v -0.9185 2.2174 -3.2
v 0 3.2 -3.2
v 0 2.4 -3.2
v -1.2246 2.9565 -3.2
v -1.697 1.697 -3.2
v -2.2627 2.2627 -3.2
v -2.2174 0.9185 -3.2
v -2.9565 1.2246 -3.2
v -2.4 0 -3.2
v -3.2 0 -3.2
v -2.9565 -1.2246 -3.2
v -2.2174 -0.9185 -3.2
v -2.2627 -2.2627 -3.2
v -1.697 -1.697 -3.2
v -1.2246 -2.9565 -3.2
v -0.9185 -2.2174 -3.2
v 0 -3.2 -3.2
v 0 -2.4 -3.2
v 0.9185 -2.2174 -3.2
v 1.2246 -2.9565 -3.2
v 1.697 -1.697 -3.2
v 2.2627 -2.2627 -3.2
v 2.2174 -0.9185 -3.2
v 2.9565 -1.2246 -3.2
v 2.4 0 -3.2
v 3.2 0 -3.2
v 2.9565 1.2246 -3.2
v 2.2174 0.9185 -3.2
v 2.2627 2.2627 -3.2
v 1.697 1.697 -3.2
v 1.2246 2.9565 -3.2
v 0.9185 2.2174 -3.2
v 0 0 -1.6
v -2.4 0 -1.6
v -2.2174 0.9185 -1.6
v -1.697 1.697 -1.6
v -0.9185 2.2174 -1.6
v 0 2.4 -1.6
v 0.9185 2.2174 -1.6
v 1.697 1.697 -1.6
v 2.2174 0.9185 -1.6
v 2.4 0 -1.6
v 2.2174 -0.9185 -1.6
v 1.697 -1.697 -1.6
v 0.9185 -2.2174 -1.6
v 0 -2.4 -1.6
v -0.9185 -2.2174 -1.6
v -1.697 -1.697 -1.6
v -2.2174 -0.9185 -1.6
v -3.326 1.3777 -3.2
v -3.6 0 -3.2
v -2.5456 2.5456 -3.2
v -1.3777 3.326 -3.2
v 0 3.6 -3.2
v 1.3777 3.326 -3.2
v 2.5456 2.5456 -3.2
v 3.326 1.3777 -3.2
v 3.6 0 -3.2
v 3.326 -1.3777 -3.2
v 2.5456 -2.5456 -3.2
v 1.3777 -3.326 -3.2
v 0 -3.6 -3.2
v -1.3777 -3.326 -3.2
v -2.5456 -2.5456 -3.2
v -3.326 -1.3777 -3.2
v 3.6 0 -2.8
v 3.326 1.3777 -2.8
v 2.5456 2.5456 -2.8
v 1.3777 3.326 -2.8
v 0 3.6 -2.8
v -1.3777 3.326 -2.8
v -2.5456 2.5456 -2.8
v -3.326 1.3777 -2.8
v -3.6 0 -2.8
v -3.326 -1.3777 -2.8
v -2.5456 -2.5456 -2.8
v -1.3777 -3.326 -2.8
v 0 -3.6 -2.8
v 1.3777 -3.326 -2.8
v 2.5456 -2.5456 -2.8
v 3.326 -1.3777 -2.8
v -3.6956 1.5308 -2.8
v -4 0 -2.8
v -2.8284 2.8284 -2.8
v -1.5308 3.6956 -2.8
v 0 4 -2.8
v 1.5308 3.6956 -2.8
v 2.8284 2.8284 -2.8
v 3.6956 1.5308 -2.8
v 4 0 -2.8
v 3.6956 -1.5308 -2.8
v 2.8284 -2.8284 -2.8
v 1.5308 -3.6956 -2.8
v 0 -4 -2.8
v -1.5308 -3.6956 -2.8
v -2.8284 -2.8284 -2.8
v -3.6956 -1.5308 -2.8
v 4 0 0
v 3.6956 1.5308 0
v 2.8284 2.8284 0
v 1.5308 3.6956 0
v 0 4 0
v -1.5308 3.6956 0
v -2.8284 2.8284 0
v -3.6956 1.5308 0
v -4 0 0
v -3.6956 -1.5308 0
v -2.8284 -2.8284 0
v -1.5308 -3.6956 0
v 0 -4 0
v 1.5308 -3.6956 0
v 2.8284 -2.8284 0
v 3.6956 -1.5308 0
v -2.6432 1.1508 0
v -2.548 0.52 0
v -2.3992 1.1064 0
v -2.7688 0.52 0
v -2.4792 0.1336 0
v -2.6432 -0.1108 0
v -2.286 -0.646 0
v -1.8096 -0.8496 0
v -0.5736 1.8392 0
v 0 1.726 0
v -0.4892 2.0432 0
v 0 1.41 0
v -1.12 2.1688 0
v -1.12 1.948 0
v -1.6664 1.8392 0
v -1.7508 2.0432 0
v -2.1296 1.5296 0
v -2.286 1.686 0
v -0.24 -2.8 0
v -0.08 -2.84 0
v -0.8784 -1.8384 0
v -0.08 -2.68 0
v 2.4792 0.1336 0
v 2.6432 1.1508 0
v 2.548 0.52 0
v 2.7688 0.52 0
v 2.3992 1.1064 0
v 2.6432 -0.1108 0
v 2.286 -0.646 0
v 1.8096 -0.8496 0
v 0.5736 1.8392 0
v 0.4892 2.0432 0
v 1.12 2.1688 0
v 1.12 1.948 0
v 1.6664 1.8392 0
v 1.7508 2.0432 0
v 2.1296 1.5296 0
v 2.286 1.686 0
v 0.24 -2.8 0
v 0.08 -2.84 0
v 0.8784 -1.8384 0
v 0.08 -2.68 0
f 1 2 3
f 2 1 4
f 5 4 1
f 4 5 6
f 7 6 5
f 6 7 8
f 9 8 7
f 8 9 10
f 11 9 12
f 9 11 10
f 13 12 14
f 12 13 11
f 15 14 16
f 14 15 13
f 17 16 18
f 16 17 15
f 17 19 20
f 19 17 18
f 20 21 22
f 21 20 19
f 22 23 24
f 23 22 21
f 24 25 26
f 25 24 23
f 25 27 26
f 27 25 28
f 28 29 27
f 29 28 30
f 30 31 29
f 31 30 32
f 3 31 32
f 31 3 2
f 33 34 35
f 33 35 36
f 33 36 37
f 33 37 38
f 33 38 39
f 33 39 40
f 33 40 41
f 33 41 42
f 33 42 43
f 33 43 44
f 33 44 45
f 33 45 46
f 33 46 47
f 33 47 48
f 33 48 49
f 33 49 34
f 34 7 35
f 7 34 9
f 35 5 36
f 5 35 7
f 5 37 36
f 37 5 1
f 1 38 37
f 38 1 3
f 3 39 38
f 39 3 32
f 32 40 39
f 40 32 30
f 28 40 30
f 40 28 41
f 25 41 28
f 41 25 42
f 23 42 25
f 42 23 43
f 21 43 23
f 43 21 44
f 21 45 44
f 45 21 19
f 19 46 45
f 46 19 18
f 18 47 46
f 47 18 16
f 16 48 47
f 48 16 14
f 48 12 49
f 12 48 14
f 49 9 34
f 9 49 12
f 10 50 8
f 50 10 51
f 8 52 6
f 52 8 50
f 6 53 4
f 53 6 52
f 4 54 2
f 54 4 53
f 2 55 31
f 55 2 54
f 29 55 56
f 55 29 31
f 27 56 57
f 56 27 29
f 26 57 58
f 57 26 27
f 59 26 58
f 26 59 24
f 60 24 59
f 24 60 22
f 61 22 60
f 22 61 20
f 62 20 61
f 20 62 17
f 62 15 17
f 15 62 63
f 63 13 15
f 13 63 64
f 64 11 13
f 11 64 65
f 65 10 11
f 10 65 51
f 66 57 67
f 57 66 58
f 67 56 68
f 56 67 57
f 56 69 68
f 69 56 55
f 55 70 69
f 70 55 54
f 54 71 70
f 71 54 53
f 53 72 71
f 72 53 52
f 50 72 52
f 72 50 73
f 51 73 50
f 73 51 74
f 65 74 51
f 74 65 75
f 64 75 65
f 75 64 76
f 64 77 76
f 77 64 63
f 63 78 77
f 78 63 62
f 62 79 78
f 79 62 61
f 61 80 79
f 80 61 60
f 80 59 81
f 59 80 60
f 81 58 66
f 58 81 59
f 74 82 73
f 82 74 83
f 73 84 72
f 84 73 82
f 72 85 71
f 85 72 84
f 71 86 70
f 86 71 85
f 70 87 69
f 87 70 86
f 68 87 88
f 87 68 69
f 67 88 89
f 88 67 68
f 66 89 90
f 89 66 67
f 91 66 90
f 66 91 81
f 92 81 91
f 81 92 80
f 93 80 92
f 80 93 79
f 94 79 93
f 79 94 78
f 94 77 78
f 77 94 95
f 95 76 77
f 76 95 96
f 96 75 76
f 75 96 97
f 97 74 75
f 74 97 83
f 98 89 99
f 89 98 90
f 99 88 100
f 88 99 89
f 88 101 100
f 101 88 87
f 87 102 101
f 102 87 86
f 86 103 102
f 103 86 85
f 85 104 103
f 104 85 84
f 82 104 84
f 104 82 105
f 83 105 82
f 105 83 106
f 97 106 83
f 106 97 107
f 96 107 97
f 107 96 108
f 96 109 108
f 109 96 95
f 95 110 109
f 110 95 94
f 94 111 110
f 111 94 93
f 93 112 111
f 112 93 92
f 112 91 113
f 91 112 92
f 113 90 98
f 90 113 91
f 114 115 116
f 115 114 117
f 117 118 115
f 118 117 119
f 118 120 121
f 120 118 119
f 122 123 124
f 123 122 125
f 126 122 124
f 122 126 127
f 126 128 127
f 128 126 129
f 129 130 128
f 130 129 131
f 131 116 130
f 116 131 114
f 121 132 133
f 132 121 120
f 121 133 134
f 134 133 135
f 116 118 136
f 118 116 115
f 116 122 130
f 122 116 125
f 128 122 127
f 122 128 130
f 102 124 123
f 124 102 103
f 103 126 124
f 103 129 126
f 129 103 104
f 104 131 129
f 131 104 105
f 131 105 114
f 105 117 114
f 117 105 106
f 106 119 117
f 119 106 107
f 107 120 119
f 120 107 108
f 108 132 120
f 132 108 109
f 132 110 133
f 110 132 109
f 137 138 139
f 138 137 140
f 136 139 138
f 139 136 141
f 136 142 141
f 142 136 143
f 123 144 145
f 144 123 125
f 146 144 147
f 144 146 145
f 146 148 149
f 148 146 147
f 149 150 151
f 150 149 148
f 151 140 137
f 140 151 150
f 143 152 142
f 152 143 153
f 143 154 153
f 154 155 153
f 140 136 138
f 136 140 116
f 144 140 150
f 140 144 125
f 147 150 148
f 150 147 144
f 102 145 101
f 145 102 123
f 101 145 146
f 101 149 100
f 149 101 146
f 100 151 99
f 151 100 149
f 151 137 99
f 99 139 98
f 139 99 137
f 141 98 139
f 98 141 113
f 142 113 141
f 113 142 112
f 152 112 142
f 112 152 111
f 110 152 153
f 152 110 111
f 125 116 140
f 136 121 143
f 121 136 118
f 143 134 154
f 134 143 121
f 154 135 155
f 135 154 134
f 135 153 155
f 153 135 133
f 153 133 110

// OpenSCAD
// file: ../p/4-4disc.scad
use <../lib.scad>
function ldraw_lib__4_4disc() = [
// 0 Disc 1.0
// 0 Name: 4-4disc.dat
// 0 Author: James Jessiman
// 0 !LDRAW_ORG Primitive UPDATE 2002-02
// 0 !LICENSE Licensed under CC BY 2.0 and CC BY 4.0 : see CAreadme.txt
// 
// 0 BFC CERTIFY CCW
  [0,"BFC","CERTIFY"],
  [0,"BFC","CCW"],
// 
// 0 !HISTORY 1998-12-15 [PTadmin] Official Update 1998-10
// 0 !HISTORY 2002-03-23 [sbliss] Added BFC statement
// 0 !HISTORY 2002-04-25 [PTadmin] Official Update 2002-02
// 0 !HISTORY 2007-06-24 [PTadmin] Header formatted for Contributor Agreement
// 0 !HISTORY 2008-07-01 [PTadmin] Official Update 2008-01
// 
// 
// 3 16 0 0 0 1 0 0 0.9239 0 0.3827
  [3,16,0,0,0,1,0,0,0.9239,0,0.3827],
// 3 16 0 0 0 0.9239 0 0.3827 0.7071 0 0.7071
  [3,16,0,0,0,0.9239,0,0.3827,0.7071,0,0.7071],
// 3 16 0 0 0 0.7071 0 0.7071 0.3827 0 0.9239
  [3,16,0,0,0,0.7071,0,0.7071,0.3827,0,0.9239],
// 3 16 0 0 0 0.3827 0 0.9239 0 0 1
  [3,16,0,0,0,0.3827,0,0.9239,0,0,1],
// 3 16 0 0 0 0 0 1 -0.3827 0 0.9239
  [3,16,0,0,0,0,0,1,-0.3827,0,0.9239],
// 3 16 0 0 0 -0.3827 0 0.9239 -0.7071 0 0.7071
  [3,16,0,0,0,-0.3827,0,0.9239,-0.7071,0,0.7071],
// 3 16 0 0 0 -0.7071 0 0.7071 -0.9239 0 0.3827
  [3,16,0,0,0,-0.7071,0,0.7071,-0.9239,0,0.3827],
// 3 16 0 0 0 -0.9239 0 0.3827 -1 0 -0
  [3,16,0,0,0,-0.9239,0,0.3827,-1,0,-0],
// 3 16 0 0 0 -1 0 -0 -0.9239 0 -0.3827
  [3,16,0,0,0,-1,0,-0,-0.9239,0,-0.3827],
// 3 16 0 0 0 -0.9239 0 -0.3827 -0.7071 0 -0.7071
  [3,16,0,0,0,-0.9239,0,-0.3827,-0.7071,0,-0.7071],
// 3 16 0 0 0 -0.7071 0 -0.7071 -0.3827 0 -0.9239
  [3,16,0,0,0,-0.7071,0,-0.7071,-0.3827,0,-0.9239],
// 3 16 0 0 0 -0.3827 0 -0.9239 0 0 -1
  [3,16,0,0,0,-0.3827,0,-0.9239,0,0,-1],
// 3 16 0 0 0 0 0 -1 0.3827 0 -0.9239
  [3,16,0,0,0,0,0,-1,0.3827,0,-0.9239],
// 3 16 0 0 0 0.3827 0 -0.9239 0.7071 0 -0.7071
  [3,16,0,0,0,0.3827,0,-0.9239,0.7071,0,-0.7071],
// 3 16 0 0 0 0.7071 0 -0.7071 0.9239 0 -0.3827
  [3,16,0,0,0,0.7071,0,-0.7071,0.9239,0,-0.3827],
// 3 16 0 0 0 0.9239 0 -0.3827 1 0 0
  [3,16,0,0,0,0.9239,0,-0.3827,1,0,0],
// 0
];
makepoly(ldraw_lib__4_4disc(), line=0.2);
// file: ../p/4-4ring3.scad
use <../lib.scad>
function ldraw_lib__4_4ring3() = [
// 0 Ring  3 x 1.0
// 0 Name: 4-4ring3.dat
// 0 Author: James Jessiman
// 0 !LDRAW_ORG Primitive UPDATE 2009-01
// 0 !LICENSE Licensed under CC BY 2.0 and CC BY 4.0 : see CAreadme.txt
// 
// 0 BFC CERTIFY CCW
  [0,"BFC","CERTIFY"],
  [0,"BFC","CCW"],
// 
// 0 !HISTORY 1998-12-15 [PTadmin] Official Update 1998-10
// 0 !HISTORY 2002-04-05 [hafhead] Added BFC statement
// 0 !HISTORY 2002-04-25 [PTadmin] Official Update 2002-02
// 0 !HISTORY 2007-06-24 [PTadmin] Header formatted for Contributor Agreement
// 0 !HISTORY 2008-07-01 [PTadmin] Official Update 2008-01
// 0 !HISTORY 2008-08-26 [cwdee] Switch polygon winding and rename
// 0 !HISTORY 2009-05-02 [PTadmin] Official Update 2009-01
// 
// 
// 4 16 -1.5308 0 3.6956 -1.1481 0 2.7717 0 0 3 0 0 4
  [4,16,-1.5308,0,3.6956,-1.1481,0,2.7717,0,0,3,0,0,4],
// 4 16 -2.8284 0 2.8284 -2.1213 0 2.1213 -1.1481 0 2.7717 -1.5308 0 3.6956
  [4,16,-2.8284,0,2.8284,-2.1213,0,2.1213,-1.1481,0,2.7717,-1.5308,0,3.6956],
// 4 16 -3.6956 0 1.5308 -2.7717 0 1.1481 -2.1213 0 2.1213 -2.8284 0 2.8284
  [4,16,-3.6956,0,1.5308,-2.7717,0,1.1481,-2.1213,0,2.1213,-2.8284,0,2.8284],
// 4 16 -4 0 0 -3 0 0 -2.7717 0 1.1481 -3.6956 0 1.5308
  [4,16,-4,0,0,-3,0,0,-2.7717,0,1.1481,-3.6956,0,1.5308],
// 4 16 -3.6956 0 -1.5308 -2.7717 0 -1.1481 -3 0 0 -4 0 0
  [4,16,-3.6956,0,-1.5308,-2.7717,0,-1.1481,-3,0,0,-4,0,0],
// 4 16 -2.8284 0 -2.8284 -2.1213 0 -2.1213 -2.7717 0 -1.1481 -3.6956 0 -1.5308
  [4,16,-2.8284,0,-2.8284,-2.1213,0,-2.1213,-2.7717,0,-1.1481,-3.6956,0,-1.5308],
// 4 16 -1.5308 0 -3.6956 -1.1481 0 -2.7717 -2.1213 0 -2.1213 -2.8284 0 -2.8284
  [4,16,-1.5308,0,-3.6956,-1.1481,0,-2.7717,-2.1213,0,-2.1213,-2.8284,0,-2.8284],
// 4 16 0 0 -4 0 0 -3 -1.1481 0 -2.7717 -1.5308 0 -3.6956
  [4,16,0,0,-4,0,0,-3,-1.1481,0,-2.7717,-1.5308,0,-3.6956],
// 4 16 1.5308 0 -3.6956 1.1481 0 -2.7717 0 0 -3 0 0 -4
  [4,16,1.5308,0,-3.6956,1.1481,0,-2.7717,0,0,-3,0,0,-4],
// 4 16 2.8284 0 -2.8284 2.1213 0 -2.1213 1.1481 0 -2.7717 1.5308 0 -3.6956
  [4,16,2.8284,0,-2.8284,2.1213,0,-2.1213,1.1481,0,-2.7717,1.5308,0,-3.6956],
// 4 16 3.6956 0 -1.5308 2.7717 0 -1.1481 2.1213 0 -2.1213 2.8284 0 -2.8284
  [4,16,3.6956,0,-1.5308,2.7717,0,-1.1481,2.1213,0,-2.1213,2.8284,0,-2.8284],
// 4 16 4 0 0 3 0 0 2.7717 0 -1.1481 3.6956 0 -1.5308
  [4,16,4,0,0,3,0,0,2.7717,0,-1.1481,3.6956,0,-1.5308],
// 4 16 3.6956 0 1.5308 2.7717 0 1.1481 3 0 0 4 0 0
  [4,16,3.6956,0,1.5308,2.7717,0,1.1481,3,0,0,4,0,0],
// 4 16 2.8284 0 2.8284 2.1213 0 2.1213 2.7717 0 1.1481 3.6956 0 1.5308
  [4,16,2.8284,0,2.8284,2.1213,0,2.1213,2.7717,0,1.1481,3.6956,0,1.5308],
// 4 16 1.5308 0 3.6956 1.1481 0 2.7717 2.1213 0 2.1213 2.8284 0 2.8284
  [4,16,1.5308,0,3.6956,1.1481,0,2.7717,2.1213,0,2.1213,2.8284,0,2.8284],
// 4 16 0 0 4 0 0 3 1.1481 0 2.7717 1.5308 0 3.6956
  [4,16,0,0,4,0,0,3,1.1481,0,2.7717,1.5308,0,3.6956],
// 0
];
makepoly(ldraw_lib__4_4ring3(), line=0.2);
// file: ../p/4-4cylc.scad
use <../lib.scad>
use <4-4cyli.scad>
use <4-4disc.scad>
use <4-4edge.scad>
function ldraw_lib__4_4cylc() = [
// 0 Cylinder Closed 1.0
// 0 Name: 4-4cylc.dat
// 0 Author: Alex Taylor [anathema]
// 0 !LDRAW_ORG Primitive UPDATE 2009-02
// 0 !LICENSE Licensed under CC BY 2.0 and CC BY 4.0 : see CAreadme.txt
// 
// 0 BFC CERTIFY CCW
  [0,"BFC","CERTIFY"],
  [0,"BFC","CCW"],
// 
// 0 !HISTORY 2008-12-29 [cwdee] Removed one disc
// 0 !HISTORY 2009-09-03 [PTadmin] Official Update 2009-02
// 
// 
// 1 16 0 0 0 1 0 0 0 1 0 0 0 1 4-4edge.dat
  [1,16,0,0,0,1,0,0,0,1,0,0,0,1, ldraw_lib__4_4edge()],
// 1 16 0 1 0 1 0 0 0 1 0 0 0 1 4-4edge.dat
  [1,16,0,1,0,1,0,0,0,1,0,0,0,1, ldraw_lib__4_4edge()],
// 1 16 0 0 0 1 0 0 0 1 0 0 0 1 4-4disc.dat
  [1,16,0,0,0,1,0,0,0,1,0,0,0,1, ldraw_lib__4_4disc()],
// 1 16 0 0 0 1 0 0 0 1 0 0 0 1 4-4cyli.dat
  [1,16,0,0,0,1,0,0,0,1,0,0,0,1, ldraw_lib__4_4cyli()],
// 0
];
makepoly(ldraw_lib__4_4cylc(), line=0.2);
// file: ../p/4-4edge.scad
use <../lib.scad>
function ldraw_lib__4_4edge() = [
// 0 Circle 1.0
// 0 Name: 4-4edge.dat
// 0 Author: James Jessiman
// 0 !LDRAW_ORG Primitive UPDATE 2017-01
// 0 !LICENSE Licensed under CC BY 2.0 and CC BY 4.0 : see CAreadme.txt
// 
// 0 BFC CERTIFY CCW
  [0,"BFC","CERTIFY"],
  [0,"BFC","CCW"],
// 
// 0 !HISTORY 1998-12-15 [PTadmin] Official Update 1998-10
// 0 !HISTORY 2005-12-28 [PTadmin] Official Update 2005-01
// 0 !HISTORY 2007-06-24 [PTadmin] Header formatted for Contributor Agreement
// 0 !HISTORY 2008-07-01 [PTadmin] Official Update 2008-01
// 0 !HISTORY 2017-01-15 [Steffen] BFCed
// 0 !HISTORY 2017-12-30 [PTadmin] Official Update 2017-01
// 
// 
// 2 24 1 0 0 0.9239 0 0.3827
  [2,24,1,0,0,0.9239,0,0.3827],
// 2 24 0.9239 0 0.3827 0.7071 0 0.7071
  [2,24,0.9239,0,0.3827,0.7071,0,0.7071],
// 2 24 0.7071 0 0.7071 0.3827 0 0.9239
  [2,24,0.7071,0,0.7071,0.3827,0,0.9239],
// 2 24 0.3827 0 0.9239 0 0 1
  [2,24,0.3827,0,0.9239,0,0,1],
// 2 24 0 0 1 -0.3827 0 0.9239
  [2,24,0,0,1,-0.3827,0,0.9239],
// 2 24 -0.3827 0 0.9239 -0.7071 0 0.7071
  [2,24,-0.3827,0,0.9239,-0.7071,0,0.7071],
// 2 24 -0.7071 0 0.7071 -0.9239 0 0.3827
  [2,24,-0.7071,0,0.7071,-0.9239,0,0.3827],
// 2 24 -0.9239 0 0.3827 -1 0 -0
  [2,24,-0.9239,0,0.3827,-1,0,-0],
// 2 24 -1 0 -0 -0.9239 0 -0.3827
  [2,24,-1,0,-0,-0.9239,0,-0.3827],
// 2 24 -0.9239 0 -0.3827 -0.7071 0 -0.7071
  [2,24,-0.9239,0,-0.3827,-0.7071,0,-0.7071],
// 2 24 -0.7071 0 -0.7071 -0.3827 0 -0.9239
  [2,24,-0.7071,0,-0.7071,-0.3827,0,-0.9239],
// 2 24 -0.3827 0 -0.9239 0 0 -1
  [2,24,-0.3827,0,-0.9239,0,0,-1],
// 2 24 0 0 -1 0.3827 0 -0.9239
  [2,24,0,0,-1,0.3827,0,-0.9239],
// 2 24 0.3827 0 -0.9239 0.7071 0 -0.7071
  [2,24,0.3827,0,-0.9239,0.7071,0,-0.7071],
// 2 24 0.7071 0 -0.7071 0.9239 0 -0.3827
  [2,24,0.7071,0,-0.7071,0.9239,0,-0.3827],
// 2 24 0.9239 0 -0.3827 1 0 0
  [2,24,0.9239,0,-0.3827,1,0,0],
];
makepoly(ldraw_lib__4_4edge(), line=0.2);
// file: ../p/4-4cyli.scad
use <../lib.scad>
function ldraw_lib__4_4cyli() = [
// 0 Cylinder 1.0
// 0 Name: 4-4cyli.dat
// 0 Author: James Jessiman
// 0 !LDRAW_ORG Primitive UPDATE 2005-01
// 0 !LICENSE Licensed under CC BY 2.0 and CC BY 4.0 : see CAreadme.txt
// 
// 0 BFC CERTIFY CCW
  [0,"BFC","CERTIFY"],
  [0,"BFC","CCW"],
// 
// 0 !HISTORY 1998-12-15 [PTadmin] Official Update 1998-10
// 0 !HISTORY 2002-03-23 [sbliss] Added BFC statement; merged headers from files in distributions LDraw 0.27 and Complete.
// 0 !HISTORY 2002-04-25 [PTadmin] Official Update 2002-02
// 0 !HISTORY 2004-12-14 [guyvivan] BFC CCW
// 0 !HISTORY 2005-12-28 [PTadmin] Official Update 2005-01
// 0 !HISTORY 2007-06-24 [PTadmin] Header formatted for Contributor Agreement
// 0 !HISTORY 2008-07-01 [PTadmin] Official Update 2008-01
// 
// 
// 4 16 1 1 0 0.9239 1 0.3827 0.9239 0 0.3827 1 0 0
  [4,16,1,1,0,0.9239,1,0.3827,0.9239,0,0.3827,1,0,0],
// 5 24 1 0 0 1 1 0 0.9239 0 0.3827 0.9239 0 -0.3827
  [5,24,1,0,0,1,1,0,0.9239,0,0.3827,0.9239,0,-0.3827],
// 4 16 0.9239 1 0.3827 0.7071 1 0.7071 0.7071 0 0.7071 0.9239 0 0.3827
  [4,16,0.9239,1,0.3827,0.7071,1,0.7071,0.7071,0,0.7071,0.9239,0,0.3827],
// 5 24 0.9239 0 0.3827 0.9239 1 0.3827 0.7071 0 0.7071 1 0 0
  [5,24,0.9239,0,0.3827,0.9239,1,0.3827,0.7071,0,0.7071,1,0,0],
// 4 16 0.7071 1 0.7071 0.3827 1 0.9239 0.3827 0 0.9239 0.7071 0 0.7071
  [4,16,0.7071,1,0.7071,0.3827,1,0.9239,0.3827,0,0.9239,0.7071,0,0.7071],
// 5 24 0.7071 0 0.7071 0.7071 1 0.7071 0.3827 0 0.9239 0.9239 0 0.3827
  [5,24,0.7071,0,0.7071,0.7071,1,0.7071,0.3827,0,0.9239,0.9239,0,0.3827],
// 4 16 0.3827 1 0.9239 0 1 1 0 0 1 0.3827 0 0.9239
  [4,16,0.3827,1,0.9239,0,1,1,0,0,1,0.3827,0,0.9239],
// 5 24 0.3827 0 0.9239 0.3827 1 0.9239 0 0 1 0.7071 0 0.7071
  [5,24,0.3827,0,0.9239,0.3827,1,0.9239,0,0,1,0.7071,0,0.7071],
// 4 16 0 1 1 -0.3827 1 0.9239 -0.3827 0 0.9239 0 0 1
  [4,16,0,1,1,-0.3827,1,0.9239,-0.3827,0,0.9239,0,0,1],
// 5 24 0 0 1 0 1 1 -0.3827 0 0.9239 0.3827 0 0.9239
  [5,24,0,0,1,0,1,1,-0.3827,0,0.9239,0.3827,0,0.9239],
// 4 16 -0.3827 1 0.9239 -0.7071 1 0.7071 -0.7071 0 0.7071 -0.3827 0 0.9239
  [4,16,-0.3827,1,0.9239,-0.7071,1,0.7071,-0.7071,0,0.7071,-0.3827,0,0.9239],
// 5 24 -0.3827 0 0.9239 -0.3827 1 0.9239 -0.7071 0 0.7071 0 0 1
  [5,24,-0.3827,0,0.9239,-0.3827,1,0.9239,-0.7071,0,0.7071,0,0,1],
// 4 16 -0.7071 1 0.7071 -0.9239 1 0.3827 -0.9239 0 0.3827 -0.7071 0 0.7071
  [4,16,-0.7071,1,0.7071,-0.9239,1,0.3827,-0.9239,0,0.3827,-0.7071,0,0.7071],
// 5 24 -0.7071 0 0.7071 -0.7071 1 0.7071 -0.9239 0 0.3827 -0.3827 0 0.9239
  [5,24,-0.7071,0,0.7071,-0.7071,1,0.7071,-0.9239,0,0.3827,-0.3827,0,0.9239],
// 4 16 -0.9239 1 0.3827 -1 1 0 -1 0 0 -0.9239 0 0.3827
  [4,16,-0.9239,1,0.3827,-1,1,0,-1,0,0,-0.9239,0,0.3827],
// 5 24 -0.9239 0 0.3827 -0.9239 1 0.3827 -1 0 0 -0.7071 0 0.7071
  [5,24,-0.9239,0,0.3827,-0.9239,1,0.3827,-1,0,0,-0.7071,0,0.7071],
// 4 16 -1 1 0 -0.9239 1 -0.3827 -0.9239 0 -0.3827 -1 0 0
  [4,16,-1,1,0,-0.9239,1,-0.3827,-0.9239,0,-0.3827,-1,0,0],
// 5 24 -1 0 0 -1 1 0 -0.9239 0 -0.3827 -0.9239 0 0.3827
  [5,24,-1,0,0,-1,1,0,-0.9239,0,-0.3827,-0.9239,0,0.3827],
// 4 16 -0.9239 1 -0.3827 -0.7071 1 -0.7071 -0.7071 0 -0.7071 -0.9239 0 -0.3827
  [4,16,-0.9239,1,-0.3827,-0.7071,1,-0.7071,-0.7071,0,-0.7071,-0.9239,0,-0.3827],
// 5 24 -0.9239 0 -0.3827 -0.9239 1 -0.3827 -0.7071 0 -0.7071 -1 0 0
  [5,24,-0.9239,0,-0.3827,-0.9239,1,-0.3827,-0.7071,0,-0.7071,-1,0,0],
// 4 16 -0.7071 1 -0.7071 -0.3827 1 -0.9239 -0.3827 0 -0.9239 -0.7071 0 -0.7071
  [4,16,-0.7071,1,-0.7071,-0.3827,1,-0.9239,-0.3827,0,-0.9239,-0.7071,0,-0.7071],
// 5 24 -0.7071 0 -0.7071 -0.7071 1 -0.7071 -0.3827 0 -0.9239 -0.9239 0 -0.3827
  [5,24,-0.7071,0,-0.7071,-0.7071,1,-0.7071,-0.3827,0,-0.9239,-0.9239,0,-0.3827],
// 4 16 -0.3827 1 -0.9239 0 1 -1 0 0 -1 -0.3827 0 -0.9239
  [4,16,-0.3827,1,-0.9239,0,1,-1,0,0,-1,-0.3827,0,-0.9239],
// 5 24 -0.3827 0 -0.9239 -0.3827 1 -0.9239 0 0 -1 -0.7071 0 -0.7071
  [5,24,-0.3827,0,-0.9239,-0.3827,1,-0.9239,0,0,-1,-0.7071,0,-0.7071],
// 4 16 0 1 -1 0.3827 1 -0.9239 0.3827 0 -0.9239 0 0 -1
  [4,16,0,1,-1,0.3827,1,-0.9239,0.3827,0,-0.9239,0,0,-1],
// 5 24 0 0 -1 0 1 -1 0.3827 0 -0.9239 -0.3827 0 -0.9239
  [5,24,0,0,-1,0,1,-1,0.3827,0,-0.9239,-0.3827,0,-0.9239],
// 4 16 0.3827 1 -0.9239 0.7071 1 -0.7071 0.7071 0 -0.7071 0.3827 0 -0.9239
  [4,16,0.3827,1,-0.9239,0.7071,1,-0.7071,0.7071,0,-0.7071,0.3827,0,-0.9239],
// 5 24 0.3827 0 -0.9239 0.3827 1 -0.9239 0.7071 0 -0.7071 0 0 -1
  [5,24,0.3827,0,-0.9239,0.3827,1,-0.9239,0.7071,0,-0.7071,0,0,-1],
// 4 16 0.7071 1 -0.7071 0.9239 1 -0.3827 0.9239 0 -0.3827 0.7071 0 -0.7071
  [4,16,0.7071,1,-0.7071,0.9239,1,-0.3827,0.9239,0,-0.3827,0.7071,0,-0.7071],
// 5 24 0.7071 0 -0.7071 0.7071 1 -0.7071 0.9239 0 -0.3827 0.3827 0 -0.9239
  [5,24,0.7071,0,-0.7071,0.7071,1,-0.7071,0.9239,0,-0.3827,0.3827,0,-0.9239],
// 4 16 0.9239 1 -0.3827 1 1 0 1 0 0 0.9239 0 -0.3827
  [4,16,0.9239,1,-0.3827,1,1,0,1,0,0,0.9239,0,-0.3827],
// 5 24 0.9239 0 -0.3827 0.9239 1 -0.3827 1 0 0 0.7071 0 -0.7071
  [5,24,0.9239,0,-0.3827,0.9239,1,-0.3827,1,0,0,0.7071,0,-0.7071],
// 0
];
makepoly(ldraw_lib__4_4cyli(), line=0.2);
// file: ../p/empty.scad
use <../lib.scad>
function ldraw_lib__empty() = [
// 0 Empty
// 0 Name: empty.dat
// 0 Author: Steffen [Steffen]
// 0 !LDRAW_ORG Primitive UPDATE 2015-01
// 0 !LICENSE Licensed under CC BY 2.0 and CC BY 4.0 : see CAreadme.txt
// 
// 0 BFC CERTIFY CCW
  [0,"BFC","CERTIFY"],
  [0,"BFC","CCW"],
// 
// 0 !HISTORY 2015-10-11 [PTadmin] Official Update 2015-01
// 
// 
// 0 // Tool MLCad cannot handle really empty files. This file is used as a workaround.
// 0 // It exceptionally contains forbidden non-LDRAW standard syntax to satisfy MLCad until it is fixed OR a different editor has become the de-facto LDRAW standard.
// 0 // The line being used here is an "impossible" conditional line which never should be visible,
// 0 // additionally hidden by a syntax explicitly hiding it from displaying.
// 
// 0 MLCAD HIDE 5 24 0 0 0 0.0001 0 0 0.0001 -0.0001 0 0 0 0
];
makepoly(ldraw_lib__empty(), line=0.2);
// file: ../p/stud4o.scad
use <../lib.scad>
use <4-4cylc.scad>
use <4-4ring3.scad>
function ldraw_lib__stud4o() = [
// 0 Stud Tube Open without Outer Cylinder
// 0 Name: stud4o.dat
// 0 Author: Magnus Forsberg [MagFors]
// 0 !LDRAW_ORG Primitive UPDATE 2011-02
// 0 !LICENSE Licensed under CC BY 2.0 and CC BY 4.0 : see CAreadme.txt
// 
// 0 !HELP This stud is a "antistud" to be used like a underside stud,
// 0 !HELP but without the outer cylinder.
// 0 !HELP 1 47 0 0 0 1 0 0 0 1 0 0 0 1 stud4.dat
// 
// 0 BFC CERTIFY CCW
  [0,"BFC","CERTIFY"],
  [0,"BFC","CCW"],
// 
// 0 !HISTORY 2011-12-29 [PTadmin] Official Update 2011-02
// 
// 
// 1 16 0 -4 0 2 0 0 0 1 0 0 0 2 4-4ring3.dat
  [1,16,0,-4,0,2,0,0,0,1,0,0,0,2, ldraw_lib__4_4ring3()],
// 0 BFC INVERTNEXT
  [0,"BFC","INVERTNEXT"],
// 1 16 0 0 0 -6 0 0 0 -4 0 0 0 6 4-4cylc.dat
  [1,16,0,0,0,-6,0,0,0,-4,0,0,0,6, ldraw_lib__4_4cylc()],
];
makepoly(ldraw_lib__stud4o(), line=0.2);
// file: ../p/4-4ring9.scad
use <../lib.scad>
function ldraw_lib__4_4ring9() = [
// 0 Ring  9 x 1.0
// 0 Name: 4-4ring9.dat
// 0 Author: John Riley [jriley]
// 0 !LDRAW_ORG Primitive UPDATE 2004-02
// 0 !LICENSE Licensed under CC BY 2.0 and CC BY 4.0 : see CAreadme.txt
// 
// 0 BFC CERTIFY CCW
  [0,"BFC","CERTIFY"],
  [0,"BFC","CCW"],
// 
// 0 !HISTORY 2004-04-22 [PTadmin] Official Update 2004-02
// 0 !HISTORY 2007-06-24 [PTadmin] Header formatted for Contributor Agreement
// 0 !HISTORY 2008-07-01 [PTadmin] Official Update 2008-01
// 
// 
// 4 16 9 0 0 10 0 0 9.239 0 3.827 8.3151 0 3.4443
  [4,16,9,0,0,10,0,0,9.239,0,3.827,8.3151,0,3.4443],
// 4 16 8.3151 0 3.4443 9.239 0 3.827 7.071 0 7.071 6.3639 0 6.3639
  [4,16,8.3151,0,3.4443,9.239,0,3.827,7.071,0,7.071,6.3639,0,6.3639],
// 4 16 6.3639 0 6.3639 7.071 0 7.071 3.827 0 9.239 3.4443 0 8.3151
  [4,16,6.3639,0,6.3639,7.071,0,7.071,3.827,0,9.239,3.4443,0,8.3151],
// 4 16 3.4443 0 8.3151 3.827 0 9.239 0 0 10 0 0 9
  [4,16,3.4443,0,8.3151,3.827,0,9.239,0,0,10,0,0,9],
// 4 16 0 0 9 0 0 10 -3.827 0 9.239 -3.4443 0 8.3151
  [4,16,0,0,9,0,0,10,-3.827,0,9.239,-3.4443,0,8.3151],
// 4 16 -3.4443 0 8.3151 -3.827 0 9.239 -7.071 0 7.071 -6.3639 0 6.3639
  [4,16,-3.4443,0,8.3151,-3.827,0,9.239,-7.071,0,7.071,-6.3639,0,6.3639],
// 4 16 -6.3639 0 6.3639 -7.071 0 7.071 -9.239 0 3.827 -8.3151 0 3.4443
  [4,16,-6.3639,0,6.3639,-7.071,0,7.071,-9.239,0,3.827,-8.3151,0,3.4443],
// 4 16 -8.3151 0 3.4443 -9.239 0 3.827 -10 0 0 -9 0 0
  [4,16,-8.3151,0,3.4443,-9.239,0,3.827,-10,0,0,-9,0,0],
// 4 16 -9 0 0 -10 0 0 -9.239 0 -3.827 -8.3151 0 -3.4443
  [4,16,-9,0,0,-10,0,0,-9.239,0,-3.827,-8.3151,0,-3.4443],
// 4 16 -8.3151 0 -3.4443 -9.239 0 -3.827 -7.071 0 -7.071 -6.3639 0 -6.3639
  [4,16,-8.3151,0,-3.4443,-9.239,0,-3.827,-7.071,0,-7.071,-6.3639,0,-6.3639],
// 4 16 -6.3639 0 -6.3639 -7.071 0 -7.071 -3.827 0 -9.239 -3.4443 0 -8.3151
  [4,16,-6.3639,0,-6.3639,-7.071,0,-7.071,-3.827,0,-9.239,-3.4443,0,-8.3151],
// 4 16 -3.4443 0 -8.3151 -3.827 0 -9.239 0 0 -10 0 0 -9
  [4,16,-3.4443,0,-8.3151,-3.827,0,-9.239,0,0,-10,0,0,-9],
// 4 16 0 0 -9 0 0 -10 3.827 0 -9.239 3.4443 0 -8.3151
  [4,16,0,0,-9,0,0,-10,3.827,0,-9.239,3.4443,0,-8.3151],
// 4 16 3.4443 0 -8.3151 3.827 0 -9.239 7.071 0 -7.071 6.3639 0 -6.3639
  [4,16,3.4443,0,-8.3151,3.827,0,-9.239,7.071,0,-7.071,6.3639,0,-6.3639],
// 4 16 6.3639 0 -6.3639 7.071 0 -7.071 9.239 0 -3.827 8.3151 0 -3.4443
  [4,16,6.3639,0,-6.3639,7.071,0,-7.071,9.239,0,-3.827,8.3151,0,-3.4443],
// 4 16 8.3151 0 -3.4443 9.239 0 -3.827 10 0 0 9 0 0
  [4,16,8.3151,0,-3.4443,9.239,0,-3.827,10,0,0,9,0,0],
// 0
];
makepoly(ldraw_lib__4_4ring9(), line=0.2);
// file: ../p/4-4ring8.scad
use <../lib.scad>
function ldraw_lib__4_4ring8() = [
// 0 Ring  8 x 1.0
// 0 Name: 4-4ring8.dat
// 0 Author: Steffen [Steffen]
// 0 !LDRAW_ORG Primitive UPDATE 2012-01
// 0 !LICENSE Licensed under CC BY 2.0 and CC BY 4.0 : see CAreadme.txt
// 
// 0 BFC CERTIFY CCW
  [0,"BFC","CERTIFY"],
  [0,"BFC","CCW"],
// 
// 0 !HISTORY 2003-12-19 [PTadmin] Official Update 2003-03
// 0 !HISTORY 2007-06-24 [PTadmin] Header formatted for Contributor Agreement
// 0 !HISTORY 2008-07-01 [PTadmin] Official Update 2008-01
// 0 !HISTORY 2012-02-16 [Philo] Changed to CCW
// 0 !HISTORY 2012-03-30 [PTadmin] Official Update 2012-01
// 
// 
// 4 16 9 0 0 8.3151 0 3.4443 7.3912 0 3.0616 8 0 0
  [4,16,9,0,0,8.3151,0,3.4443,7.3912,0,3.0616,8,0,0],
// 4 16 8.3151 0 3.4443 6.3639 0 6.3639 5.6568 0 5.6568 7.3912 0 3.0616
  [4,16,8.3151,0,3.4443,6.3639,0,6.3639,5.6568,0,5.6568,7.3912,0,3.0616],
// 4 16 6.3639 0 6.3639 3.4443 0 8.3151 3.0616 0 7.3912 5.6568 0 5.6568
  [4,16,6.3639,0,6.3639,3.4443,0,8.3151,3.0616,0,7.3912,5.6568,0,5.6568],
// 4 16 3.4443 0 8.3151 0 0 9 0 0 8 3.0616 0 7.3912
  [4,16,3.4443,0,8.3151,0,0,9,0,0,8,3.0616,0,7.3912],
// 4 16 0 0 9 -3.4443 0 8.3151 -3.0616 0 7.3912 0 0 8
  [4,16,0,0,9,-3.4443,0,8.3151,-3.0616,0,7.3912,0,0,8],
// 4 16 -3.4443 0 8.3151 -6.3639 0 6.3639 -5.6568 0 5.6568 -3.0616 0 7.3912
  [4,16,-3.4443,0,8.3151,-6.3639,0,6.3639,-5.6568,0,5.6568,-3.0616,0,7.3912],
// 4 16 -6.3639 0 6.3639 -8.3151 0 3.4443 -7.3912 0 3.0616 -5.6568 0 5.6568
  [4,16,-6.3639,0,6.3639,-8.3151,0,3.4443,-7.3912,0,3.0616,-5.6568,0,5.6568],
// 4 16 -8.3151 0 3.4443 -9 0 0 -8 0 0 -7.3912 0 3.0616
  [4,16,-8.3151,0,3.4443,-9,0,0,-8,0,0,-7.3912,0,3.0616],
// 4 16 -9 0 0 -8.3151 0 -3.4443 -7.3912 0 -3.0616 -8 0 0
  [4,16,-9,0,0,-8.3151,0,-3.4443,-7.3912,0,-3.0616,-8,0,0],
// 4 16 -8.3151 0 -3.4443 -6.3639 0 -6.3639 -5.6568 0 -5.6568 -7.3912 0 -3.0616
  [4,16,-8.3151,0,-3.4443,-6.3639,0,-6.3639,-5.6568,0,-5.6568,-7.3912,0,-3.0616],
// 4 16 -6.3639 0 -6.3639 -3.4443 0 -8.3151 -3.0616 0 -7.3912 -5.6568 0 -5.6568
  [4,16,-6.3639,0,-6.3639,-3.4443,0,-8.3151,-3.0616,0,-7.3912,-5.6568,0,-5.6568],
// 4 16 -3.4443 0 -8.3151 0 0 -9 0 0 -8 -3.0616 0 -7.3912
  [4,16,-3.4443,0,-8.3151,0,0,-9,0,0,-8,-3.0616,0,-7.3912],
// 4 16 0 0 -9 3.4443 0 -8.3151 3.0616 0 -7.3912 0 0 -8
  [4,16,0,0,-9,3.4443,0,-8.3151,3.0616,0,-7.3912,0,0,-8],
// 4 16 3.4443 0 -8.3151 6.3639 0 -6.3639 5.6568 0 -5.6568 3.0616 0 -7.3912
  [4,16,3.4443,0,-8.3151,6.3639,0,-6.3639,5.6568,0,-5.6568,3.0616,0,-7.3912],
// 4 16 6.3639 0 -6.3639 8.3151 0 -3.4443 7.3912 0 -3.0616 5.6568 0 -5.6568
  [4,16,6.3639,0,-6.3639,8.3151,0,-3.4443,7.3912,0,-3.0616,5.6568,0,-5.6568],
// 4 16 8.3151 0 -3.4443 9 0 0 8 0 0 7.3912 0 -3.0616
  [4,16,8.3151,0,-3.4443,9,0,0,8,0,0,7.3912,0,-3.0616],
];
makepoly(ldraw_lib__4_4ring8(), line=0.2);
// file: ../p/4-4cylo.scad
use <../lib.scad>
use <4-4cyli.scad>
use <4-4edge.scad>
function ldraw_lib__4_4cylo() = [
// 0 Cylinder Open 1.0
// 0 Name: 4-4cylo.dat
// 0 Author: Mark Kennedy [mkennedy]
// 0 !LDRAW_ORG Primitive UPDATE 2010-01
// 0 !LICENSE Licensed under CC BY 2.0 and CC BY 4.0 : see CAreadme.txt
// 
// 0 BFC CERTIFY CCW
  [0,"BFC","CERTIFY"],
  [0,"BFC","CCW"],
// 
// 0 !HISTORY 2010-04-05 [PTadmin] Official Update 2010-01
// 
// 
// 1 16 0 0 0 1 0 0 0 1 0 0 0 1 4-4edge.dat
  [1,16,0,0,0,1,0,0,0,1,0,0,0,1, ldraw_lib__4_4edge()],
// 1 16 0 1 0 1 0 0 0 1 0 0 0 1 4-4edge.dat
  [1,16,0,1,0,1,0,0,0,1,0,0,0,1, ldraw_lib__4_4edge()],
// 1 16 0 0 0 1 0 0 0 1 0 0 0 1 4-4cyli.dat
  [1,16,0,0,0,1,0,0,0,1,0,0,0,1, ldraw_lib__4_4cyli()],
// 0
];
makepoly(ldraw_lib__4_4cylo(), line=0.2);
// file: ../p/1-16chrd.scad
use <../lib.scad>
use <empty.scad>
function ldraw_lib__1_16chrd() = [
// 0 Chord 0.0625
// 0 Name: 1-16chrd.dat
// 0 Author: Philippe Hurbain [Philo]
// 0 !LDRAW_ORG Primitive UPDATE 2015-01
// 0 !LICENSE Licensed under CC BY 2.0 and CC BY 4.0 : see CAreadme.txt
// 
// 0 BFC CERTIFY CCW
  [0,"BFC","CERTIFY"],
  [0,"BFC","CCW"],
// 
// 0 !HISTORY 2015-10-11 [PTadmin] Official Update 2015-01
// 
// 
// 0 // This file is intentionally empty because at the current \P resolution,
// 0 // an 1-16chrd is actually empty. However, this file still is present
// 0 // to allow tools to do primitives substition and fill in a real chrd here,
// 0 // or, if desired, to substitute this with the hi-res 48\1-16chrd.
// 
// 0 // This file is based on an idea by Darats at http://forums.ldraw.org/read.php?19,14500,14500#msg-14500
// 
// 1 16 0 0 0 1 0 0 0 1 0 0 0 1 empty.dat
  [1,16,0,0,0,1,0,0,0,1,0,0,0,1, ldraw_lib__empty()],
];
makepoly(ldraw_lib__1_16chrd(), line=0.2);
// file: s/98138s02.scad
use <../../lib.scad>
use <../../p/4-4cylo.scad>
use <../../p/4-4ring8.scad>
use <../../p/4-4ring9.scad>
use <../../p/stud4o.scad>
function ldraw_lib__s__98138s02() = [
// 0 ~Tile  1 x  1 Round with Groove without Complete Top Face
// 0 Name: s\98138s02.dat
// 0 Author: Magnus Forsberg [MagFors]
// 0 !LDRAW_ORG Subpart UPDATE 2020-01
// 0 !LICENSE Licensed under CC BY 2.0 and CC BY 4.0 : see CAreadme.txt
// 
// 0 BFC CERTIFY CCW
  [0,"BFC","CERTIFY"],
  [0,"BFC","CCW"],
// 
// 0 !HISTORY 2020-06-28 [PTadmin] Official Update 2020-01
// 
// 
// 1 16 0 4 0 1 0 0 0 -1 0 0 0 1 stud4o.dat
  [1,16,0,4,0,1,0,0,0,-1,0,0,0,1, ldraw_lib__stud4o()],
// 1 16 0 8 0 -1 0 0 0 -1 0 0 0 1 4-4ring8.dat
  [1,16,0,8,0,-1,0,0,0,-1,0,0,0,1, ldraw_lib__4_4ring8()],
// 1 16 0 7 0 9 0 0 0 1 0 0 0 9 4-4cylo.dat
  [1,16,0,7,0,9,0,0,0,1,0,0,0,9, ldraw_lib__4_4cylo()],
// 1 16 0 7 0 -1 0 0 0 -1 0 0 0 1 4-4ring9.dat
  [1,16,0,7,0,-1,0,0,0,-1,0,0,0,1, ldraw_lib__4_4ring9()],
// 1 16 0 0 0 10 0 0 0 7 0 0 0 10 4-4cylo.dat
  [1,16,0,0,0,10,0,0,0,7,0,0,0,10, ldraw_lib__4_4cylo()],
];
makepoly(ldraw_lib__s__98138s02(), line=0.2);
// file: ../p/4-4ering.scad
use <../lib.scad>
use <1-16chrd.scad>
function ldraw_lib__4_4ering() = [
// 0 Adapter Ring Triangles to Normal 1.0
// 0 Name: 4-4ering.dat
// 0 Author: Philippe Hurbain [Philo]
// 0 !LDRAW_ORG Primitive UPDATE 2015-01
// 0 !LICENSE Licensed under CC BY 2.0 and CC BY 4.0 : see CAreadme.txt
// 
// 0 BFC CERTIFY CCW
  [0,"BFC","CERTIFY"],
  [0,"BFC","CCW"],
// 
// 0 !HISTORY 2015-10-11 [PTadmin] Official Update 2015-01
// 
// 
// 0 // This file uses 1-16chrd (actually empty). It allows
// 0 // tools to do primitives substition and fill in a ring of chrd here,
// 0 // or, if desired, to substitute this with the hi-res 48\1-16chrd.
// 0 // This file is based on an idea by Darats at http://forums.ldraw.org/read.php?19,14500,14500#msg-14500
// 
// 1 16 0 0 0 1 0 0 0 1 0 0 0 1 1-16chrd.dat
  [1,16,0,0,0,1,0,0,0,1,0,0,0,1, ldraw_lib__1_16chrd()],
// 1 16 0 0 0 0.92388 0 0.38268 0 1 0 -0.38268 0 0.92388 1-16chrd.dat
  [1,16,0,0,0,0.92388,0,0.38268,0,1,0,-0.38268,0,0.92388, ldraw_lib__1_16chrd()],
// 1 16 0 0 0 0.70711 0 0.70711 0 1 0 -0.70711 0 0.70711 1-16chrd.dat
  [1,16,0,0,0,0.70711,0,0.70711,0,1,0,-0.70711,0,0.70711, ldraw_lib__1_16chrd()],
// 1 16 0 0 0 0.38268 0 0.92388 0 1 0 -0.92388 0 0.38268 1-16chrd.dat
  [1,16,0,0,0,0.38268,0,0.92388,0,1,0,-0.92388,0,0.38268, ldraw_lib__1_16chrd()],
// 1 16 0 0 0 0 0 1 0 1 0 -1 0 0 1-16chrd.dat
  [1,16,0,0,0,0,0,1,0,1,0,-1,0,0, ldraw_lib__1_16chrd()],
// 1 16 0 0 0 -0.38268 0 0.92388 0 1 0 -0.92388 0 -0.38268 1-16chrd.dat
  [1,16,0,0,0,-0.38268,0,0.92388,0,1,0,-0.92388,0,-0.38268, ldraw_lib__1_16chrd()],
// 1 16 0 0 0 -0.70711 0 0.70711 0 1 0 -0.70711 0 -0.70711 1-16chrd.dat
  [1,16,0,0,0,-0.70711,0,0.70711,0,1,0,-0.70711,0,-0.70711, ldraw_lib__1_16chrd()],
// 1 16 0 0 0 -0.92388 0 0.38268 0 1 0 -0.38268 0 -0.92388 1-16chrd.dat
  [1,16,0,0,0,-0.92388,0,0.38268,0,1,0,-0.38268,0,-0.92388, ldraw_lib__1_16chrd()],
// 1 16 0 0 0 0 0 -1 0 1 0 1 0 0 1-16chrd.dat
  [1,16,0,0,0,0,0,-1,0,1,0,1,0,0, ldraw_lib__1_16chrd()],
// 1 16 0 0 0 0.38268 0 -0.92388 0 1 0 0.92388 0 0.38268 1-16chrd.dat
  [1,16,0,0,0,0.38268,0,-0.92388,0,1,0,0.92388,0,0.38268, ldraw_lib__1_16chrd()],
// 1 16 0 0 0 0.70711 0 -0.70711 0 1 0 0.70711 0 0.70711 1-16chrd.dat
  [1,16,0,0,0,0.70711,0,-0.70711,0,1,0,0.70711,0,0.70711, ldraw_lib__1_16chrd()],
// 1 16 0 0 0 0.92388 0 -0.38268 0 1 0 0.38268 0 0.92388 1-16chrd.dat
  [1,16,0,0,0,0.92388,0,-0.38268,0,1,0,0.38268,0,0.92388, ldraw_lib__1_16chrd()],
// 1 16 0 0 0 -1 0 0 0 1 0 0 0 -1 1-16chrd.dat
  [1,16,0,0,0,-1,0,0,0,1,0,0,0,-1, ldraw_lib__1_16chrd()],
// 1 16 0 0 0 -0.92388 0 -0.38268 0 1 0 0.38268 0 -0.92388 1-16chrd.dat
  [1,16,0,0,0,-0.92388,0,-0.38268,0,1,0,0.38268,0,-0.92388, ldraw_lib__1_16chrd()],
// 1 16 0 0 0 -0.70711 0 -0.70711 0 1 0 0.70711 0 -0.70711 1-16chrd.dat
  [1,16,0,0,0,-0.70711,0,-0.70711,0,1,0,0.70711,0,-0.70711, ldraw_lib__1_16chrd()],
// 1 16 0 0 0 -0.38268 0 -0.92388 0 1 0 0.92388 0 -0.38268 1-16chrd.dat
  [1,16,0,0,0,-0.38268,0,-0.92388,0,1,0,0.92388,0,-0.38268, ldraw_lib__1_16chrd()],
];
makepoly(ldraw_lib__4_4ering(), line=0.2);
// main file
use <../lib.scad>
use <../p/4-4ering.scad>
use <s/98138s02.scad>
function ldraw_lib__98138p0t() = [
// 0 Tile  1 x  1 Round with Heart with Rainbow Stripes Pattern
// 0 Name: 98138p0t.dat
// 0 Author: Philippe Hurbain [Philo]
// 0 !LDRAW_ORG Part UPDATE 2020-01
// 0 !LICENSE Licensed under CC BY 2.0 and CC BY 4.0 : see CAreadme.txt
// 
// 0 BFC CERTIFY CCW
  [0,"BFC","CERTIFY"],
  [0,"BFC","CCW"],
// 
// 0 !KEYWORDS Bricklink 98138pb139
// 
// 0 !HISTORY 2020-06-28 [PTadmin] Official Update 2020-01
// 
// 
// 1 16 0 0 0 1 0 0 0 1 0 0 0 1 s\98138s02.dat
  [1,16,0,0,0,1,0,0,0,1,0,0,0,1, ldraw_lib__s__98138s02()],
// 1 16 0 0 0 10 0 0 0 1 0 0 0 10 4-4ering.dat
  [1,16,0,0,0,10,0,0,0,1,0,0,0,10, ldraw_lib__4_4ering()],
// 4 3 -6.37 0 1.3 -5.998 0 2.766 -6.608 0 2.877 -6.922 0 1.3
  [4,3,-6.37,0,1.3,-5.998,0,2.766,-6.608,0,2.877,-6.922,0,1.3],
// 4 3 -6.198 0 0.334 -6.37 0 1.3 -6.922 0 1.3 -6.608 0 -0.277
  [4,3,-6.198,0,0.334,-6.37,0,1.3,-6.922,0,1.3,-6.608,0,-0.277],
// 4 3 -4.524 0 -2.124 -6.198 0 0.334 -6.608 0 -0.277 -5.715 0 -1.615
  [4,3,-4.524,0,-2.124,-6.198,0,0.334,-6.608,0,-0.277,-5.715,0,-1.615],
// 4 3 -1.434 0 4.598 0 0 3.525 0 0 4.315 -1.223 0 5.108
  [4,3,-1.434,0,4.598,0,0,3.525,0,0,4.315,-1.223,0,5.108],
// 4 3 -2.8 0 4.87 -1.434 0 4.598 -1.223 0 5.108 -2.8 0 5.422
  [4,3,-2.8,0,4.87,-1.434,0,4.598,-1.223,0,5.108,-2.8,0,5.422],
// 4 3 -4.166 0 4.598 -2.8 0 4.87 -2.8 0 5.422 -4.377 0 5.108
  [4,3,-4.166,0,4.598,-2.8,0,4.87,-2.8,0,5.422,-4.377,0,5.108],
// 4 3 -5.324 0 3.824 -4.166 0 4.598 -4.377 0 5.108 -5.715 0 4.215
  [4,3,-5.324,0,3.824,-4.166,0,4.598,-4.377,0,5.108,-5.715,0,4.215],
// 4 3 -5.998 0 2.766 -5.324 0 3.824 -5.715 0 4.215 -6.608 0 2.877
  [4,3,-5.998,0,2.766,-5.324,0,3.824,-5.715,0,4.215,-6.608,0,2.877],
// 4 3 -5.715 0 -1.615 -0.6 0 -7 -0.2 0 -7.1 -4.524 0 -2.124
  [4,3,-5.715,0,-1.615,-0.6,0,-7,-0.2,0,-7.1,-4.524,0,-2.124],
// 3 3 -4.524 0 -2.124 -0.2 0 -7.1 -2.196 0 -4.596
  [3,3,-4.524,0,-2.124,-0.2,0,-7.1,-2.196,0,-4.596],
// 3 3 -2.196 0 -4.596 -0.2 0 -7.1 -0.2 0 -6.7
  [3,3,-2.196,0,-4.596,-0.2,0,-7.1,-0.2,0,-6.7],
// 4 226 -5.998 0 2.766 -6.37 0 1.3 -6.198 0 0.334 6.198 0 0.334
  [4,226,-5.998,0,2.766,-6.37,0,1.3,-6.198,0,0.334,6.198,0,0.334],
// 4 353 -5.324 0 3.824 -5.998 0 2.766 0 0 3.525 -1.434 0 4.598
  [4,353,-5.324,0,3.824,-5.998,0,2.766,0,0,3.525,-1.434,0,4.598],
// 4 353 -4.166 0 4.598 -5.324 0 3.824 -1.434 0 4.598 -2.8 0 4.87
  [4,353,-4.166,0,4.598,-5.324,0,3.824,-1.434,0,4.598,-2.8,0,4.87],
// 4 16 -1.223 0 5.108 0 0 4.315 0 0 10 -3.827 0 9.239
  [4,16,-1.223,0,5.108,0,0,4.315,0,0,10,-3.827,0,9.239],
// 3 16 -3.827 0 9.239 -2.8 0 5.422 -1.223 0 5.108
  [3,16,-3.827,0,9.239,-2.8,0,5.422,-1.223,0,5.108],
// 4 16 -4.377 0 5.108 -2.8 0 5.422 -3.827 0 9.239 -7.071 0 7.071
  [4,16,-4.377,0,5.108,-2.8,0,5.422,-3.827,0,9.239,-7.071,0,7.071],
// 4 16 -5.715 0 4.215 -4.377 0 5.108 -7.071 0 7.071 -9.239 0 3.827
  [4,16,-5.715,0,4.215,-4.377,0,5.108,-7.071,0,7.071,-9.239,0,3.827],
// 3 16 -5.715 0 4.215 -9.239 0 3.827 -6.608 0 2.877
  [3,16,-5.715,0,4.215,-9.239,0,3.827,-6.608,0,2.877],
// 4 16 -6.922 0 1.3 -6.608 0 2.877 -9.239 0 3.827 -10 0 0
  [4,16,-6.922,0,1.3,-6.608,0,2.877,-9.239,0,3.827,-10,0,0],
// 4 16 -6.608 0 -0.277 -6.922 0 1.3 -10 0 0 -9.239 0 -3.827
  [4,16,-6.608,0,-0.277,-6.922,0,1.3,-10,0,0,-9.239,0,-3.827],
// 4 16 -5.715 0 -1.615 -6.608 0 -0.277 -9.239 0 -3.827 -7.071 0 -7.071
  [4,16,-5.715,0,-1.615,-6.608,0,-0.277,-9.239,0,-3.827,-7.071,0,-7.071],
// 4 16 -0.6 0 -7 -5.715 0 -1.615 -7.071 0 -7.071 -3.827 0 -9.239
  [4,16,-0.6,0,-7,-5.715,0,-1.615,-7.071,0,-7.071,-3.827,0,-9.239],
// 4 16 -0.2 0 -7.1 -0.6 0 -7 -3.827 0 -9.239 0 0 -10
  [4,16,-0.2,0,-7.1,-0.6,0,-7,-3.827,0,-9.239,0,0,-10],
// 4 3 6.608 0 2.877 5.998 0 2.766 6.37 0 1.3 6.922 0 1.3
  [4,3,6.608,0,2.877,5.998,0,2.766,6.37,0,1.3,6.922,0,1.3],
// 4 3 6.922 0 1.3 6.37 0 1.3 6.198 0 0.334 6.608 0 -0.277
  [4,3,6.922,0,1.3,6.37,0,1.3,6.198,0,0.334,6.608,0,-0.277],
// 4 3 6.608 0 -0.277 6.198 0 0.334 4.524 0 -2.124 5.715 0 -1.615
  [4,3,6.608,0,-0.277,6.198,0,0.334,4.524,0,-2.124,5.715,0,-1.615],
// 4 3 0 0 4.315 0 0 3.525 1.434 0 4.598 1.223 0 5.108
  [4,3,0,0,4.315,0,0,3.525,1.434,0,4.598,1.223,0,5.108],
// 4 3 1.223 0 5.108 1.434 0 4.598 2.8 0 4.87 2.8 0 5.422
  [4,3,1.223,0,5.108,1.434,0,4.598,2.8,0,4.87,2.8,0,5.422],
// 4 3 2.8 0 5.422 2.8 0 4.87 4.166 0 4.598 4.377 0 5.108
  [4,3,2.8,0,5.422,2.8,0,4.87,4.166,0,4.598,4.377,0,5.108],
// 4 3 4.377 0 5.108 4.166 0 4.598 5.324 0 3.824 5.715 0 4.215
  [4,3,4.377,0,5.108,4.166,0,4.598,5.324,0,3.824,5.715,0,4.215],
// 4 3 5.715 0 4.215 5.324 0 3.824 5.998 0 2.766 6.608 0 2.877
  [4,3,5.715,0,4.215,5.324,0,3.824,5.998,0,2.766,6.608,0,2.877],
// 4 3 0.2 0 -7.1 0.6 0 -7 5.715 0 -1.615 4.524 0 -2.124
  [4,3,0.2,0,-7.1,0.6,0,-7,5.715,0,-1.615,4.524,0,-2.124],
// 3 3 4.524 0 -2.124 2.196 0 -4.596 0.2 0 -7.1
  [3,3,4.524,0,-2.124,2.196,0,-4.596,0.2,0,-7.1],
// 3 3 2.196 0 -4.596 0.2 0 -6.7 0.2 0 -7.1
  [3,3,2.196,0,-4.596,0.2,0,-6.7,0.2,0,-7.1],
// 4 226 6.198 0 0.334 6.37 0 1.3 5.998 0 2.766 -5.998 0 2.766
  [4,226,6.198,0,0.334,6.37,0,1.3,5.998,0,2.766,-5.998,0,2.766],
// 4 353 0 0 3.525 5.998 0 2.766 5.324 0 3.824 1.434 0 4.598
  [4,353,0,0,3.525,5.998,0,2.766,5.324,0,3.824,1.434,0,4.598],
// 4 353 1.434 0 4.598 5.324 0 3.824 4.166 0 4.598 2.8 0 4.87
  [4,353,1.434,0,4.598,5.324,0,3.824,4.166,0,4.598,2.8,0,4.87],
// 4 16 0 0 10 0 0 4.315 1.223 0 5.108 3.827 0 9.239
  [4,16,0,0,10,0,0,4.315,1.223,0,5.108,3.827,0,9.239],
// 3 16 3.827 0 9.239 1.223 0 5.108 2.8 0 5.422
  [3,16,3.827,0,9.239,1.223,0,5.108,2.8,0,5.422],
// 4 16 3.827 0 9.239 2.8 0 5.422 4.377 0 5.108 7.071 0 7.071
  [4,16,3.827,0,9.239,2.8,0,5.422,4.377,0,5.108,7.071,0,7.071],
// 4 16 7.071 0 7.071 4.377 0 5.108 5.715 0 4.215 9.239 0 3.827
  [4,16,7.071,0,7.071,4.377,0,5.108,5.715,0,4.215,9.239,0,3.827],
// 3 16 5.715 0 4.215 6.608 0 2.877 9.239 0 3.827
  [3,16,5.715,0,4.215,6.608,0,2.877,9.239,0,3.827],
// 4 16 9.239 0 3.827 6.608 0 2.877 6.922 0 1.3 10 0 0
  [4,16,9.239,0,3.827,6.608,0,2.877,6.922,0,1.3,10,0,0],
// 4 16 10 0 0 6.922 0 1.3 6.608 0 -0.277 9.239 0 -3.827
  [4,16,10,0,0,6.922,0,1.3,6.608,0,-0.277,9.239,0,-3.827],
// 4 16 9.239 0 -3.827 6.608 0 -0.277 5.715 0 -1.615 7.071 0 -7.071
  [4,16,9.239,0,-3.827,6.608,0,-0.277,5.715,0,-1.615,7.071,0,-7.071],
// 4 16 7.071 0 -7.071 5.715 0 -1.615 0.6 0 -7 3.827 0 -9.239
  [4,16,7.071,0,-7.071,5.715,0,-1.615,0.6,0,-7,3.827,0,-9.239],
// 4 16 3.827 0 -9.239 0.6 0 -7 0.2 0 -7.1 0 0 -10
  [4,16,3.827,0,-9.239,0.6,0,-7,0.2,0,-7.1,0,0,-10],
// 3 353 0 0 3.525 -5.998 0 2.766 5.998 0 2.766
  [3,353,0,0,3.525,-5.998,0,2.766,5.998,0,2.766],
// 4 3 6.198 0 0.334 -6.198 0 0.334 -4.524 0 -2.124 4.524 0 -2.124
  [4,3,6.198,0,0.334,-6.198,0,0.334,-4.524,0,-2.124,4.524,0,-2.124],
// 4 321 4.524 0 -2.124 -4.524 0 -2.124 -2.196 0 -4.596 2.196 0 -4.596
  [4,321,4.524,0,-2.124,-4.524,0,-2.124,-2.196,0,-4.596,2.196,0,-4.596],
// 4 30 2.196 0 -4.596 -2.196 0 -4.596 -0.2 0 -6.7 0.2 0 -6.7
  [4,30,2.196,0,-4.596,-2.196,0,-4.596,-0.2,0,-6.7,0.2,0,-6.7],
// 4 3 0.2 0 -6.7 -0.2 0 -6.7 -0.2 0 -7.1 0.2 0 -7.1
  [4,3,0.2,0,-6.7,-0.2,0,-6.7,-0.2,0,-7.1,0.2,0,-7.1],
// 3 16 0.2 0 -7.1 -0.2 0 -7.1 0 0 -10
  [3,16,0.2,0,-7.1,-0.2,0,-7.1,0,0,-10],
];
makepoly(ldraw_lib__98138p0t(), line=0.2);
